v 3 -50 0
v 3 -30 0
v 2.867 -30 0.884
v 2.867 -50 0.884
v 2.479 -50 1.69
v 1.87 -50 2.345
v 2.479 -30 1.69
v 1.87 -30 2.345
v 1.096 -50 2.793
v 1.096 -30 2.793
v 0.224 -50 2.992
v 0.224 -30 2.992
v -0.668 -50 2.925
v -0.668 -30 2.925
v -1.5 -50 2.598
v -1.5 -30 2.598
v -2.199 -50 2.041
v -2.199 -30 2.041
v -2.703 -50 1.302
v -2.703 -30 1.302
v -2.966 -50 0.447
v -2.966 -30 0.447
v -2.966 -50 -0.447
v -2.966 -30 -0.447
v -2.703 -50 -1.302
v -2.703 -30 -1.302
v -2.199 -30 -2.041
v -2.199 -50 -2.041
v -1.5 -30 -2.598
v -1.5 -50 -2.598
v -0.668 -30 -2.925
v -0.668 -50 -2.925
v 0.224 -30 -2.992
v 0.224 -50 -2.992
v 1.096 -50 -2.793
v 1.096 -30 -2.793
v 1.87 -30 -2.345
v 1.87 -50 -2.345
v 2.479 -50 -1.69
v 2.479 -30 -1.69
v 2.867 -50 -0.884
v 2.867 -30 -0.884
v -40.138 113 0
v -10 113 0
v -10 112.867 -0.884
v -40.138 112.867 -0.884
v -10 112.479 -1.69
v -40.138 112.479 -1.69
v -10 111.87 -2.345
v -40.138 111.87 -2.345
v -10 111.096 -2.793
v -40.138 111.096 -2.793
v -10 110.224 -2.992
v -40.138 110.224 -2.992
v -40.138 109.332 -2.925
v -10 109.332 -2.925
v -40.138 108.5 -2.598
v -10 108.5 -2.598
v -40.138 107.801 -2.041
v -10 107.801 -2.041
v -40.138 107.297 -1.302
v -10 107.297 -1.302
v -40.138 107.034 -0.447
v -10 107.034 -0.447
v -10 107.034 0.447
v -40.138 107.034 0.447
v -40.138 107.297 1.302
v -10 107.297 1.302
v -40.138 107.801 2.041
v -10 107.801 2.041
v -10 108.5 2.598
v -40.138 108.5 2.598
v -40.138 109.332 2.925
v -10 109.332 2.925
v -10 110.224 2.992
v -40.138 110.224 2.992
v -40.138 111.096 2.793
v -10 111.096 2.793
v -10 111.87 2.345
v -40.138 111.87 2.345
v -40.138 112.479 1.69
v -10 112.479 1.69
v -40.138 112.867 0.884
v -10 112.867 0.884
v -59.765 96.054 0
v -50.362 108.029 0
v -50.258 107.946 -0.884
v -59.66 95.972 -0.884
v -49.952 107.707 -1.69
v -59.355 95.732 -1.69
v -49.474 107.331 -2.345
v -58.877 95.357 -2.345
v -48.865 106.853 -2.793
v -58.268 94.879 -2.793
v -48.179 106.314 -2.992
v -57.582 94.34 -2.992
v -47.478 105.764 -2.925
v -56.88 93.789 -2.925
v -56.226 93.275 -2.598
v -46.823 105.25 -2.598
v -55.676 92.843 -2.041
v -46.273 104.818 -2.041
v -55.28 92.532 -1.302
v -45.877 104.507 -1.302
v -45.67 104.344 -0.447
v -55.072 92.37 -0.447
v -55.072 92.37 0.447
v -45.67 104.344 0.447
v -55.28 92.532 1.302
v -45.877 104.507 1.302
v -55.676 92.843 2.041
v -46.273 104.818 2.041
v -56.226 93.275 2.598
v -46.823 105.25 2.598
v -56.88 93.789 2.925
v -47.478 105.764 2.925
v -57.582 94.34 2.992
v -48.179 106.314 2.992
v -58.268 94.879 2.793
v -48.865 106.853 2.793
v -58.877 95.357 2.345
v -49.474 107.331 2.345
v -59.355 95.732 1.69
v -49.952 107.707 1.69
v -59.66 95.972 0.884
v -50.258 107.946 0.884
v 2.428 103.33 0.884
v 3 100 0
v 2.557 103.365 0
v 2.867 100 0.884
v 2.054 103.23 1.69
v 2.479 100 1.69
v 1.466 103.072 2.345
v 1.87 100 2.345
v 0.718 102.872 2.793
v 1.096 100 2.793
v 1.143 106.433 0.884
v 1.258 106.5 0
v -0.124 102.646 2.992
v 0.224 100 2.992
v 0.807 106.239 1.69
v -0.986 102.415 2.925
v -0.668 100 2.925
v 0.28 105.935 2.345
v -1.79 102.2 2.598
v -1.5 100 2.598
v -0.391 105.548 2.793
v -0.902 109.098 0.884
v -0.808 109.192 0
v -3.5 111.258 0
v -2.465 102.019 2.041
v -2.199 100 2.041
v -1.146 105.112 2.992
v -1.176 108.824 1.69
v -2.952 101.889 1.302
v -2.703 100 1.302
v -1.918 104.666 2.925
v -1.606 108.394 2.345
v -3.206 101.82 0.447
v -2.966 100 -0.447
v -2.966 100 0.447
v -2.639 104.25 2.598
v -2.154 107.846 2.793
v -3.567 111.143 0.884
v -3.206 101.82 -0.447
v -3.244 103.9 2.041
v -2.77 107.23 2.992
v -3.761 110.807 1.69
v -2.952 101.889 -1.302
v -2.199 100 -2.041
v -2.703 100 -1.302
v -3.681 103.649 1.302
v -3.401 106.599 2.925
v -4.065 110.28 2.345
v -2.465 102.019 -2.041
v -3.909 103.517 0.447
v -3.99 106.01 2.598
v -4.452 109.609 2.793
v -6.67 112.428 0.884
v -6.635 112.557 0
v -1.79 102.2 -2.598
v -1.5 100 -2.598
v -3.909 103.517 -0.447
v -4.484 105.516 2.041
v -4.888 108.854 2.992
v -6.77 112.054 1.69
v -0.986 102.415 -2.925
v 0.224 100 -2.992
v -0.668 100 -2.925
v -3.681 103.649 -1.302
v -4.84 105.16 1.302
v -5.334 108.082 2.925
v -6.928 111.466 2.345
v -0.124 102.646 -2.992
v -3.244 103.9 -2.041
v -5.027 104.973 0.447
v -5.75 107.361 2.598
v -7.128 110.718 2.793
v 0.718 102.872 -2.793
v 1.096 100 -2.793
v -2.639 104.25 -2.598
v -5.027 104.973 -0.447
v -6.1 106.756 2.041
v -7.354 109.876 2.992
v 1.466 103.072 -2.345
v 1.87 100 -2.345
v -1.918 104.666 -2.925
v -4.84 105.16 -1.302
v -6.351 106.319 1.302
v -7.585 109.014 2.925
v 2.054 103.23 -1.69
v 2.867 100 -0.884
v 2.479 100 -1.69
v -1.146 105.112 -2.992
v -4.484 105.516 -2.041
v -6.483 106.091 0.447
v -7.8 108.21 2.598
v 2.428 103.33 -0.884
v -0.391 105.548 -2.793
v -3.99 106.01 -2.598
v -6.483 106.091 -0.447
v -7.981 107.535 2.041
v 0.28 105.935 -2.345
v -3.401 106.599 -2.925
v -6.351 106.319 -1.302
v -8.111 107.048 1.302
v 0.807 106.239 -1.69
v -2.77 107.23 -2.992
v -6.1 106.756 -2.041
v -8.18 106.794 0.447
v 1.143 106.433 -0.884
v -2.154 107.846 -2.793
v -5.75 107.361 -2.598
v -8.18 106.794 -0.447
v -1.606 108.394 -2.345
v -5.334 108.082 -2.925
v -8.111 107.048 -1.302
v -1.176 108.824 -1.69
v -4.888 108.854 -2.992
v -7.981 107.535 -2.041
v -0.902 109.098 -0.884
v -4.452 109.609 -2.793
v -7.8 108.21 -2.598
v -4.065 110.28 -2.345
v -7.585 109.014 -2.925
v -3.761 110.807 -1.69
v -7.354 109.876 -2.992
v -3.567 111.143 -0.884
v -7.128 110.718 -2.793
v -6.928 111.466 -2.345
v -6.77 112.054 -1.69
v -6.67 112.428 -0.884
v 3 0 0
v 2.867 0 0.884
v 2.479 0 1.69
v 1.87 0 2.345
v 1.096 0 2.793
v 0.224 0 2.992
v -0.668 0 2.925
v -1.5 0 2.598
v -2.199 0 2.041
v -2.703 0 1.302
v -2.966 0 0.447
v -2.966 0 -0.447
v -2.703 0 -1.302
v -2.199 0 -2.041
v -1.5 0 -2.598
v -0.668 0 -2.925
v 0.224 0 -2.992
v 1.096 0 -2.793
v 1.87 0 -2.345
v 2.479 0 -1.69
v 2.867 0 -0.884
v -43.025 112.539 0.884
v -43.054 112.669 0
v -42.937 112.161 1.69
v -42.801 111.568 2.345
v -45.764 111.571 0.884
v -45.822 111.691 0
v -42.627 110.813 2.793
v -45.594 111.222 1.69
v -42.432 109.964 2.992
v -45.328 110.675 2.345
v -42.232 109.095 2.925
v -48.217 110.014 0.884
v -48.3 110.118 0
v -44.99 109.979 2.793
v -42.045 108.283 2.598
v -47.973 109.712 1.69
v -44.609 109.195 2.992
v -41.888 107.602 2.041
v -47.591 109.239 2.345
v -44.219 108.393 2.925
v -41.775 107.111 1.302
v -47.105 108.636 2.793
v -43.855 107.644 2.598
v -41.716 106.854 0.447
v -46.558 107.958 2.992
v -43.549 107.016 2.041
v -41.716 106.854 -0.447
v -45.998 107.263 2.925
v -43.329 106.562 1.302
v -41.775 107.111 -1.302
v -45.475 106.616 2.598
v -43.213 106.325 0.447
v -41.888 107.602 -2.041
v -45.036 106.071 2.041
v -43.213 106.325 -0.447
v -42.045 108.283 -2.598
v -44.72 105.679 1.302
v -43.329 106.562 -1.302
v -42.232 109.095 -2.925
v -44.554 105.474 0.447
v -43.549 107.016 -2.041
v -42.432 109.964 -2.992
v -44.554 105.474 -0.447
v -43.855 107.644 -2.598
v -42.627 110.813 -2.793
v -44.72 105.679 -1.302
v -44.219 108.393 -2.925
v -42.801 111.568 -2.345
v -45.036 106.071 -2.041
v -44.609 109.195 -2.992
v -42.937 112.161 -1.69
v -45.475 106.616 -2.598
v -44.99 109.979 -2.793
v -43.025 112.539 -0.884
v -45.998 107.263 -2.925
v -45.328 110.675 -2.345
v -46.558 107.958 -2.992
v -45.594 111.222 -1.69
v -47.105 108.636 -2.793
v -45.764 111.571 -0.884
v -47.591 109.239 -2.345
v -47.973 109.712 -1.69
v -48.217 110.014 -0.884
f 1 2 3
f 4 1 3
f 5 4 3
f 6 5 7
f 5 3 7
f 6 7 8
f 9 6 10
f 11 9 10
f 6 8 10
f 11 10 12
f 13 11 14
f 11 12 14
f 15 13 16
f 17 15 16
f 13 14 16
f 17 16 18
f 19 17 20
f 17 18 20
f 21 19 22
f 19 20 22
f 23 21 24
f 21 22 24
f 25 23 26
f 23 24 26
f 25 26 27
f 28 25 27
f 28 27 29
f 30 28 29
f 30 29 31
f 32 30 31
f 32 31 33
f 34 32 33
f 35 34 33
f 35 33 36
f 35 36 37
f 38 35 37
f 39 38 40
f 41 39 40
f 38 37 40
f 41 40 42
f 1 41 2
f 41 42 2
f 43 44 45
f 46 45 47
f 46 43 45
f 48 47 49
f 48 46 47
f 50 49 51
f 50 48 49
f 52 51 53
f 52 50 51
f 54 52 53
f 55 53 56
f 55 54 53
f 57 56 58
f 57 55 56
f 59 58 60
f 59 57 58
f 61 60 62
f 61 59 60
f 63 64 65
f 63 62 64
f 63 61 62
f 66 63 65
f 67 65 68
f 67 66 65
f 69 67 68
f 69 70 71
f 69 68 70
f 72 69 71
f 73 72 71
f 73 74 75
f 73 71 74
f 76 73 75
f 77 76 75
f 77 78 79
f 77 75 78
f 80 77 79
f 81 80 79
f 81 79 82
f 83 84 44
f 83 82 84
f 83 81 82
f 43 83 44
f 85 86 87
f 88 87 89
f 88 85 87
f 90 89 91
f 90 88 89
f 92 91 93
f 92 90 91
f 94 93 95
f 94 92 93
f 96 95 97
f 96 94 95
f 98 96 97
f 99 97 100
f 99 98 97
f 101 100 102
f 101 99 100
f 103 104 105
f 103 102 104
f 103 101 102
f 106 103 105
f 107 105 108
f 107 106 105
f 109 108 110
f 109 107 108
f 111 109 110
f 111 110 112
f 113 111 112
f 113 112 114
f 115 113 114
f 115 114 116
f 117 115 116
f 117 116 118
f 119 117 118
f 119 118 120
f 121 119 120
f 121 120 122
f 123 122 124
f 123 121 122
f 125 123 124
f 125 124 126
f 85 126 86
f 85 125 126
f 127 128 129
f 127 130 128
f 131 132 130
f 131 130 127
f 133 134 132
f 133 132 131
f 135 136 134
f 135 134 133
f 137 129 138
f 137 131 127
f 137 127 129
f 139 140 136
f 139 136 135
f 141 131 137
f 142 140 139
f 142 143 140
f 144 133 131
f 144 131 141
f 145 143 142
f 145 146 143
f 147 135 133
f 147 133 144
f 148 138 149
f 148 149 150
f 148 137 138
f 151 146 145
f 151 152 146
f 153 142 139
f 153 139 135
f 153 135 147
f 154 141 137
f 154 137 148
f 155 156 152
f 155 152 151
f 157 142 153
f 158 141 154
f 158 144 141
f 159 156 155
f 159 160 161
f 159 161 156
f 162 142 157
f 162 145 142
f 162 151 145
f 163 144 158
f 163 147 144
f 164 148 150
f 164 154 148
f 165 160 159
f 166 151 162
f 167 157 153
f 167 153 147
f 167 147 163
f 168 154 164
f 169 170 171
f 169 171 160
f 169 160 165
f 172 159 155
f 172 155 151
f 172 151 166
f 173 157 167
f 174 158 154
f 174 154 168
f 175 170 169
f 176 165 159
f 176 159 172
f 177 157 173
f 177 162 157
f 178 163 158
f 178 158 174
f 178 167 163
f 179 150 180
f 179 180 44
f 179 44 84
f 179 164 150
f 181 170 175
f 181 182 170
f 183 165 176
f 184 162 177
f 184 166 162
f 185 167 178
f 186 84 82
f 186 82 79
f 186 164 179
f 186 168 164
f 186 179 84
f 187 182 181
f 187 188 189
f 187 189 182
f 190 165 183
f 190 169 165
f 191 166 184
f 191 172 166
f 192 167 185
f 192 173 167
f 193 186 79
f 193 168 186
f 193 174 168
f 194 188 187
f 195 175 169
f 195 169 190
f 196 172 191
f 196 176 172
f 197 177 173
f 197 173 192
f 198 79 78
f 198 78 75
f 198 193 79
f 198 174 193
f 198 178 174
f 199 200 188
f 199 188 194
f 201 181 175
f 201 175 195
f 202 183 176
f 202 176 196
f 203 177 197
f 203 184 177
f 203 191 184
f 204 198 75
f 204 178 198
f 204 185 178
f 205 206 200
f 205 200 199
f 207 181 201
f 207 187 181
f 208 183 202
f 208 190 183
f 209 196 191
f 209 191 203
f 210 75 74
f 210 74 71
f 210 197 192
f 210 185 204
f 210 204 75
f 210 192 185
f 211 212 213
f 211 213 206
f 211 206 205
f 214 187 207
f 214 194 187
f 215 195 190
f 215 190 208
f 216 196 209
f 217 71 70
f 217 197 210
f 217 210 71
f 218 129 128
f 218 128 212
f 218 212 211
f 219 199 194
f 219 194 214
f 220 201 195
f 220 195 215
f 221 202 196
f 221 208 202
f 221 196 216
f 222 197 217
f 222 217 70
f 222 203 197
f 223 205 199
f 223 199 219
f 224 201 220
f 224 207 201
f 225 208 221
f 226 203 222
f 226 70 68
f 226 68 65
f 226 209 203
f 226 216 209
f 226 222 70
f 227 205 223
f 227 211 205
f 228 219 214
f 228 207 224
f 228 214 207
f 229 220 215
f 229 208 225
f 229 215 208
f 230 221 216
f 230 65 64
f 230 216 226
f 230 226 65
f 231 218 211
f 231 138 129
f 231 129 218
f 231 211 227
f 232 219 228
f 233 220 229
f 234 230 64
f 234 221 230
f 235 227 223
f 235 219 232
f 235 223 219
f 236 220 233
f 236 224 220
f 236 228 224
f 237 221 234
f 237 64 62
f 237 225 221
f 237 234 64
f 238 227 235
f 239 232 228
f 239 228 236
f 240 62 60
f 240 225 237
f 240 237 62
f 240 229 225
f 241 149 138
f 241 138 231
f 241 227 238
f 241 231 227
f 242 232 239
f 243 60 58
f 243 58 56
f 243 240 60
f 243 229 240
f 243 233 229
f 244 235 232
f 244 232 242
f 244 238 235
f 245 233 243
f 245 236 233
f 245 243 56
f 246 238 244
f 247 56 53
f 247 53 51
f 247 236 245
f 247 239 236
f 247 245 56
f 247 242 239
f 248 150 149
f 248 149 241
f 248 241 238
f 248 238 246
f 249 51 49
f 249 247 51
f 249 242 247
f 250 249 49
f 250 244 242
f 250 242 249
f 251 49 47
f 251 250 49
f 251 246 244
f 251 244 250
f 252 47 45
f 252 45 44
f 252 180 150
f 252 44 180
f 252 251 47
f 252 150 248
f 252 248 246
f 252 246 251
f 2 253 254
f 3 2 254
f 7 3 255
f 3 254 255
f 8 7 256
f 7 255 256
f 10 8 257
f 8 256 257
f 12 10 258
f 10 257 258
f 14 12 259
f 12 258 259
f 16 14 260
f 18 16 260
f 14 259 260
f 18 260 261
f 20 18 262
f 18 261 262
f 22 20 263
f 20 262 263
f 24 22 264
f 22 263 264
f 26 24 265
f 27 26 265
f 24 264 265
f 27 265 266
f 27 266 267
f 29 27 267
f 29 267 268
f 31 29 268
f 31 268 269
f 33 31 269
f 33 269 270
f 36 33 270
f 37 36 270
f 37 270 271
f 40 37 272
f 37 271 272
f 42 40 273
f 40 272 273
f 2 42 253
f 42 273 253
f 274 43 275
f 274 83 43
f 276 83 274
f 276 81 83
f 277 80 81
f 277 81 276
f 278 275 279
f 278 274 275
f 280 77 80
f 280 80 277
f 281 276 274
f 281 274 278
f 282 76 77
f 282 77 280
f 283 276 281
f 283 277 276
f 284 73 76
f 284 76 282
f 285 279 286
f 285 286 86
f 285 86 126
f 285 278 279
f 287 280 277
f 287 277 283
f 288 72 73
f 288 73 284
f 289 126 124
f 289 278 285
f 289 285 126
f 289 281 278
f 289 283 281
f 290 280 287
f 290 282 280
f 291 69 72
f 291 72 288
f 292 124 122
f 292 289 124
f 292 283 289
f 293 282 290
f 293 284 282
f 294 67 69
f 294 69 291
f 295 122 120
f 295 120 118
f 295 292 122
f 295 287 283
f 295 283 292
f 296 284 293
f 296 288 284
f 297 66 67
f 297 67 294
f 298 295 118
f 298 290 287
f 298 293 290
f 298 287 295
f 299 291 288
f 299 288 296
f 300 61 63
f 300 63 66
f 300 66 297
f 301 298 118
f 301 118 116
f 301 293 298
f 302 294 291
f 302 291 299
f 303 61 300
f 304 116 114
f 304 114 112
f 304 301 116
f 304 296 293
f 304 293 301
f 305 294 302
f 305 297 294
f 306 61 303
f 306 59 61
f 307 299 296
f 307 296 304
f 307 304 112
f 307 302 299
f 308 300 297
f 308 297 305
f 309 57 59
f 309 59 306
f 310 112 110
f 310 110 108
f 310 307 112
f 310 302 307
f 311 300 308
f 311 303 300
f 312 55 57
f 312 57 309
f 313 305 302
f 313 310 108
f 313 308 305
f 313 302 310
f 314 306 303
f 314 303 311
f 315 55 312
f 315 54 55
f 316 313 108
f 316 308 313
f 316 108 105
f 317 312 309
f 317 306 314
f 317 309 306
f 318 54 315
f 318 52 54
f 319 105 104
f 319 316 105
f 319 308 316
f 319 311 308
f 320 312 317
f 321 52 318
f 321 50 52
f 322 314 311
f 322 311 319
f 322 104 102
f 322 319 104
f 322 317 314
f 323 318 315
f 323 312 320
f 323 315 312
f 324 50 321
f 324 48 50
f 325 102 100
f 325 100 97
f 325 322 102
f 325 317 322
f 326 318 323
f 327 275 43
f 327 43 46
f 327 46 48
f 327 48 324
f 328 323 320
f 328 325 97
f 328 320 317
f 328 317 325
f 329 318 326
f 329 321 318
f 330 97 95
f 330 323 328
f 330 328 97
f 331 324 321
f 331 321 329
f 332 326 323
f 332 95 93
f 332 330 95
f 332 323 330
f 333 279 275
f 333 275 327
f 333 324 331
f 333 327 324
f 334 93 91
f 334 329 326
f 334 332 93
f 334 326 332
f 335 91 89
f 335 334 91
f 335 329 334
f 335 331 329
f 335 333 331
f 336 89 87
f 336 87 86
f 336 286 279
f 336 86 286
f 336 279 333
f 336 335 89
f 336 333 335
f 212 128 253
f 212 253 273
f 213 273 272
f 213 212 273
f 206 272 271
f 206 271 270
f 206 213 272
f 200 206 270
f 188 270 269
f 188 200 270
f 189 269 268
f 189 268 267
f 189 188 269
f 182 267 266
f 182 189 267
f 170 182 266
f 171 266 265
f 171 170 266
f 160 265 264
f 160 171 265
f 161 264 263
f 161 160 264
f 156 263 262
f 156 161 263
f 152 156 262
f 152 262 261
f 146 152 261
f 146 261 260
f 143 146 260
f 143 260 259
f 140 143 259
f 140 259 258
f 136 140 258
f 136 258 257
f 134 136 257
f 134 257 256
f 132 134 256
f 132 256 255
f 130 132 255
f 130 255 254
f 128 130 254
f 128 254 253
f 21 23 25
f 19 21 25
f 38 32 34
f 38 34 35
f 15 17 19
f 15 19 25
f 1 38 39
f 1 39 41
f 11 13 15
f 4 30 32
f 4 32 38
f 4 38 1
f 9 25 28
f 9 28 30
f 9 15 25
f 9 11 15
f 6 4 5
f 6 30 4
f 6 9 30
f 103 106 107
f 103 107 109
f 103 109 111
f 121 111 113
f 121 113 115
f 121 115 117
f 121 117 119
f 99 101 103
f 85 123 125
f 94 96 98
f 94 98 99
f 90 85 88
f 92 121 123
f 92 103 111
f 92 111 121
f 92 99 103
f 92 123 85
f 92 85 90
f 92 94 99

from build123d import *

# Parameters (mm, degrees)
SKETCH2_R           = 3
SKETCH4_R           = 3
BOSS_EXTRUDE1_DEPTH = 30
SKETCH5_R           = 3
BOSS_EXTRUDE2_DEPTH = 20


with BuildPart() as part:
    # Sweep1: sweep along a path in Sketch1
    with BuildLine(Plane.XY) as sweep1_path:
        Line((0, 0), (0, 100))
        ThreePointArc((0, 100), (-2.928932188, 107.071067812), (-10, 110))
        Line((-10, 110), (-40.137832809, 110))
        ThreePointArc((-40.137832809, 110), (-44.510528091, 108.993305064), (-48.002829333, 106.175907194))
        Line((-48.002829333, 106.175907194), (-57.405523913, 94.201608056))
    # Sketch2 → Sweep1 (sweep)
    with BuildSketch(Plane(origin=(0, 0, 0), x_dir=(1, 0, 0), z_dir=(0, 1, 0))):
        Circle(SKETCH2_R)
    sweep(path=sweep1_path.line)

    # Sketch4 → Boss-Extrude1 (add)
    with BuildSketch(Plane.XZ):
        Circle(SKETCH4_R)
    extrude(amount=BOSS_EXTRUDE1_DEPTH)

    # Sketch5 → Boss-Extrude2 (add)
    with BuildSketch(Plane.XZ.offset(30)):
        Circle(SKETCH5_R)
    extrude(amount=BOSS_EXTRUDE2_DEPTH)


solid = part.part
